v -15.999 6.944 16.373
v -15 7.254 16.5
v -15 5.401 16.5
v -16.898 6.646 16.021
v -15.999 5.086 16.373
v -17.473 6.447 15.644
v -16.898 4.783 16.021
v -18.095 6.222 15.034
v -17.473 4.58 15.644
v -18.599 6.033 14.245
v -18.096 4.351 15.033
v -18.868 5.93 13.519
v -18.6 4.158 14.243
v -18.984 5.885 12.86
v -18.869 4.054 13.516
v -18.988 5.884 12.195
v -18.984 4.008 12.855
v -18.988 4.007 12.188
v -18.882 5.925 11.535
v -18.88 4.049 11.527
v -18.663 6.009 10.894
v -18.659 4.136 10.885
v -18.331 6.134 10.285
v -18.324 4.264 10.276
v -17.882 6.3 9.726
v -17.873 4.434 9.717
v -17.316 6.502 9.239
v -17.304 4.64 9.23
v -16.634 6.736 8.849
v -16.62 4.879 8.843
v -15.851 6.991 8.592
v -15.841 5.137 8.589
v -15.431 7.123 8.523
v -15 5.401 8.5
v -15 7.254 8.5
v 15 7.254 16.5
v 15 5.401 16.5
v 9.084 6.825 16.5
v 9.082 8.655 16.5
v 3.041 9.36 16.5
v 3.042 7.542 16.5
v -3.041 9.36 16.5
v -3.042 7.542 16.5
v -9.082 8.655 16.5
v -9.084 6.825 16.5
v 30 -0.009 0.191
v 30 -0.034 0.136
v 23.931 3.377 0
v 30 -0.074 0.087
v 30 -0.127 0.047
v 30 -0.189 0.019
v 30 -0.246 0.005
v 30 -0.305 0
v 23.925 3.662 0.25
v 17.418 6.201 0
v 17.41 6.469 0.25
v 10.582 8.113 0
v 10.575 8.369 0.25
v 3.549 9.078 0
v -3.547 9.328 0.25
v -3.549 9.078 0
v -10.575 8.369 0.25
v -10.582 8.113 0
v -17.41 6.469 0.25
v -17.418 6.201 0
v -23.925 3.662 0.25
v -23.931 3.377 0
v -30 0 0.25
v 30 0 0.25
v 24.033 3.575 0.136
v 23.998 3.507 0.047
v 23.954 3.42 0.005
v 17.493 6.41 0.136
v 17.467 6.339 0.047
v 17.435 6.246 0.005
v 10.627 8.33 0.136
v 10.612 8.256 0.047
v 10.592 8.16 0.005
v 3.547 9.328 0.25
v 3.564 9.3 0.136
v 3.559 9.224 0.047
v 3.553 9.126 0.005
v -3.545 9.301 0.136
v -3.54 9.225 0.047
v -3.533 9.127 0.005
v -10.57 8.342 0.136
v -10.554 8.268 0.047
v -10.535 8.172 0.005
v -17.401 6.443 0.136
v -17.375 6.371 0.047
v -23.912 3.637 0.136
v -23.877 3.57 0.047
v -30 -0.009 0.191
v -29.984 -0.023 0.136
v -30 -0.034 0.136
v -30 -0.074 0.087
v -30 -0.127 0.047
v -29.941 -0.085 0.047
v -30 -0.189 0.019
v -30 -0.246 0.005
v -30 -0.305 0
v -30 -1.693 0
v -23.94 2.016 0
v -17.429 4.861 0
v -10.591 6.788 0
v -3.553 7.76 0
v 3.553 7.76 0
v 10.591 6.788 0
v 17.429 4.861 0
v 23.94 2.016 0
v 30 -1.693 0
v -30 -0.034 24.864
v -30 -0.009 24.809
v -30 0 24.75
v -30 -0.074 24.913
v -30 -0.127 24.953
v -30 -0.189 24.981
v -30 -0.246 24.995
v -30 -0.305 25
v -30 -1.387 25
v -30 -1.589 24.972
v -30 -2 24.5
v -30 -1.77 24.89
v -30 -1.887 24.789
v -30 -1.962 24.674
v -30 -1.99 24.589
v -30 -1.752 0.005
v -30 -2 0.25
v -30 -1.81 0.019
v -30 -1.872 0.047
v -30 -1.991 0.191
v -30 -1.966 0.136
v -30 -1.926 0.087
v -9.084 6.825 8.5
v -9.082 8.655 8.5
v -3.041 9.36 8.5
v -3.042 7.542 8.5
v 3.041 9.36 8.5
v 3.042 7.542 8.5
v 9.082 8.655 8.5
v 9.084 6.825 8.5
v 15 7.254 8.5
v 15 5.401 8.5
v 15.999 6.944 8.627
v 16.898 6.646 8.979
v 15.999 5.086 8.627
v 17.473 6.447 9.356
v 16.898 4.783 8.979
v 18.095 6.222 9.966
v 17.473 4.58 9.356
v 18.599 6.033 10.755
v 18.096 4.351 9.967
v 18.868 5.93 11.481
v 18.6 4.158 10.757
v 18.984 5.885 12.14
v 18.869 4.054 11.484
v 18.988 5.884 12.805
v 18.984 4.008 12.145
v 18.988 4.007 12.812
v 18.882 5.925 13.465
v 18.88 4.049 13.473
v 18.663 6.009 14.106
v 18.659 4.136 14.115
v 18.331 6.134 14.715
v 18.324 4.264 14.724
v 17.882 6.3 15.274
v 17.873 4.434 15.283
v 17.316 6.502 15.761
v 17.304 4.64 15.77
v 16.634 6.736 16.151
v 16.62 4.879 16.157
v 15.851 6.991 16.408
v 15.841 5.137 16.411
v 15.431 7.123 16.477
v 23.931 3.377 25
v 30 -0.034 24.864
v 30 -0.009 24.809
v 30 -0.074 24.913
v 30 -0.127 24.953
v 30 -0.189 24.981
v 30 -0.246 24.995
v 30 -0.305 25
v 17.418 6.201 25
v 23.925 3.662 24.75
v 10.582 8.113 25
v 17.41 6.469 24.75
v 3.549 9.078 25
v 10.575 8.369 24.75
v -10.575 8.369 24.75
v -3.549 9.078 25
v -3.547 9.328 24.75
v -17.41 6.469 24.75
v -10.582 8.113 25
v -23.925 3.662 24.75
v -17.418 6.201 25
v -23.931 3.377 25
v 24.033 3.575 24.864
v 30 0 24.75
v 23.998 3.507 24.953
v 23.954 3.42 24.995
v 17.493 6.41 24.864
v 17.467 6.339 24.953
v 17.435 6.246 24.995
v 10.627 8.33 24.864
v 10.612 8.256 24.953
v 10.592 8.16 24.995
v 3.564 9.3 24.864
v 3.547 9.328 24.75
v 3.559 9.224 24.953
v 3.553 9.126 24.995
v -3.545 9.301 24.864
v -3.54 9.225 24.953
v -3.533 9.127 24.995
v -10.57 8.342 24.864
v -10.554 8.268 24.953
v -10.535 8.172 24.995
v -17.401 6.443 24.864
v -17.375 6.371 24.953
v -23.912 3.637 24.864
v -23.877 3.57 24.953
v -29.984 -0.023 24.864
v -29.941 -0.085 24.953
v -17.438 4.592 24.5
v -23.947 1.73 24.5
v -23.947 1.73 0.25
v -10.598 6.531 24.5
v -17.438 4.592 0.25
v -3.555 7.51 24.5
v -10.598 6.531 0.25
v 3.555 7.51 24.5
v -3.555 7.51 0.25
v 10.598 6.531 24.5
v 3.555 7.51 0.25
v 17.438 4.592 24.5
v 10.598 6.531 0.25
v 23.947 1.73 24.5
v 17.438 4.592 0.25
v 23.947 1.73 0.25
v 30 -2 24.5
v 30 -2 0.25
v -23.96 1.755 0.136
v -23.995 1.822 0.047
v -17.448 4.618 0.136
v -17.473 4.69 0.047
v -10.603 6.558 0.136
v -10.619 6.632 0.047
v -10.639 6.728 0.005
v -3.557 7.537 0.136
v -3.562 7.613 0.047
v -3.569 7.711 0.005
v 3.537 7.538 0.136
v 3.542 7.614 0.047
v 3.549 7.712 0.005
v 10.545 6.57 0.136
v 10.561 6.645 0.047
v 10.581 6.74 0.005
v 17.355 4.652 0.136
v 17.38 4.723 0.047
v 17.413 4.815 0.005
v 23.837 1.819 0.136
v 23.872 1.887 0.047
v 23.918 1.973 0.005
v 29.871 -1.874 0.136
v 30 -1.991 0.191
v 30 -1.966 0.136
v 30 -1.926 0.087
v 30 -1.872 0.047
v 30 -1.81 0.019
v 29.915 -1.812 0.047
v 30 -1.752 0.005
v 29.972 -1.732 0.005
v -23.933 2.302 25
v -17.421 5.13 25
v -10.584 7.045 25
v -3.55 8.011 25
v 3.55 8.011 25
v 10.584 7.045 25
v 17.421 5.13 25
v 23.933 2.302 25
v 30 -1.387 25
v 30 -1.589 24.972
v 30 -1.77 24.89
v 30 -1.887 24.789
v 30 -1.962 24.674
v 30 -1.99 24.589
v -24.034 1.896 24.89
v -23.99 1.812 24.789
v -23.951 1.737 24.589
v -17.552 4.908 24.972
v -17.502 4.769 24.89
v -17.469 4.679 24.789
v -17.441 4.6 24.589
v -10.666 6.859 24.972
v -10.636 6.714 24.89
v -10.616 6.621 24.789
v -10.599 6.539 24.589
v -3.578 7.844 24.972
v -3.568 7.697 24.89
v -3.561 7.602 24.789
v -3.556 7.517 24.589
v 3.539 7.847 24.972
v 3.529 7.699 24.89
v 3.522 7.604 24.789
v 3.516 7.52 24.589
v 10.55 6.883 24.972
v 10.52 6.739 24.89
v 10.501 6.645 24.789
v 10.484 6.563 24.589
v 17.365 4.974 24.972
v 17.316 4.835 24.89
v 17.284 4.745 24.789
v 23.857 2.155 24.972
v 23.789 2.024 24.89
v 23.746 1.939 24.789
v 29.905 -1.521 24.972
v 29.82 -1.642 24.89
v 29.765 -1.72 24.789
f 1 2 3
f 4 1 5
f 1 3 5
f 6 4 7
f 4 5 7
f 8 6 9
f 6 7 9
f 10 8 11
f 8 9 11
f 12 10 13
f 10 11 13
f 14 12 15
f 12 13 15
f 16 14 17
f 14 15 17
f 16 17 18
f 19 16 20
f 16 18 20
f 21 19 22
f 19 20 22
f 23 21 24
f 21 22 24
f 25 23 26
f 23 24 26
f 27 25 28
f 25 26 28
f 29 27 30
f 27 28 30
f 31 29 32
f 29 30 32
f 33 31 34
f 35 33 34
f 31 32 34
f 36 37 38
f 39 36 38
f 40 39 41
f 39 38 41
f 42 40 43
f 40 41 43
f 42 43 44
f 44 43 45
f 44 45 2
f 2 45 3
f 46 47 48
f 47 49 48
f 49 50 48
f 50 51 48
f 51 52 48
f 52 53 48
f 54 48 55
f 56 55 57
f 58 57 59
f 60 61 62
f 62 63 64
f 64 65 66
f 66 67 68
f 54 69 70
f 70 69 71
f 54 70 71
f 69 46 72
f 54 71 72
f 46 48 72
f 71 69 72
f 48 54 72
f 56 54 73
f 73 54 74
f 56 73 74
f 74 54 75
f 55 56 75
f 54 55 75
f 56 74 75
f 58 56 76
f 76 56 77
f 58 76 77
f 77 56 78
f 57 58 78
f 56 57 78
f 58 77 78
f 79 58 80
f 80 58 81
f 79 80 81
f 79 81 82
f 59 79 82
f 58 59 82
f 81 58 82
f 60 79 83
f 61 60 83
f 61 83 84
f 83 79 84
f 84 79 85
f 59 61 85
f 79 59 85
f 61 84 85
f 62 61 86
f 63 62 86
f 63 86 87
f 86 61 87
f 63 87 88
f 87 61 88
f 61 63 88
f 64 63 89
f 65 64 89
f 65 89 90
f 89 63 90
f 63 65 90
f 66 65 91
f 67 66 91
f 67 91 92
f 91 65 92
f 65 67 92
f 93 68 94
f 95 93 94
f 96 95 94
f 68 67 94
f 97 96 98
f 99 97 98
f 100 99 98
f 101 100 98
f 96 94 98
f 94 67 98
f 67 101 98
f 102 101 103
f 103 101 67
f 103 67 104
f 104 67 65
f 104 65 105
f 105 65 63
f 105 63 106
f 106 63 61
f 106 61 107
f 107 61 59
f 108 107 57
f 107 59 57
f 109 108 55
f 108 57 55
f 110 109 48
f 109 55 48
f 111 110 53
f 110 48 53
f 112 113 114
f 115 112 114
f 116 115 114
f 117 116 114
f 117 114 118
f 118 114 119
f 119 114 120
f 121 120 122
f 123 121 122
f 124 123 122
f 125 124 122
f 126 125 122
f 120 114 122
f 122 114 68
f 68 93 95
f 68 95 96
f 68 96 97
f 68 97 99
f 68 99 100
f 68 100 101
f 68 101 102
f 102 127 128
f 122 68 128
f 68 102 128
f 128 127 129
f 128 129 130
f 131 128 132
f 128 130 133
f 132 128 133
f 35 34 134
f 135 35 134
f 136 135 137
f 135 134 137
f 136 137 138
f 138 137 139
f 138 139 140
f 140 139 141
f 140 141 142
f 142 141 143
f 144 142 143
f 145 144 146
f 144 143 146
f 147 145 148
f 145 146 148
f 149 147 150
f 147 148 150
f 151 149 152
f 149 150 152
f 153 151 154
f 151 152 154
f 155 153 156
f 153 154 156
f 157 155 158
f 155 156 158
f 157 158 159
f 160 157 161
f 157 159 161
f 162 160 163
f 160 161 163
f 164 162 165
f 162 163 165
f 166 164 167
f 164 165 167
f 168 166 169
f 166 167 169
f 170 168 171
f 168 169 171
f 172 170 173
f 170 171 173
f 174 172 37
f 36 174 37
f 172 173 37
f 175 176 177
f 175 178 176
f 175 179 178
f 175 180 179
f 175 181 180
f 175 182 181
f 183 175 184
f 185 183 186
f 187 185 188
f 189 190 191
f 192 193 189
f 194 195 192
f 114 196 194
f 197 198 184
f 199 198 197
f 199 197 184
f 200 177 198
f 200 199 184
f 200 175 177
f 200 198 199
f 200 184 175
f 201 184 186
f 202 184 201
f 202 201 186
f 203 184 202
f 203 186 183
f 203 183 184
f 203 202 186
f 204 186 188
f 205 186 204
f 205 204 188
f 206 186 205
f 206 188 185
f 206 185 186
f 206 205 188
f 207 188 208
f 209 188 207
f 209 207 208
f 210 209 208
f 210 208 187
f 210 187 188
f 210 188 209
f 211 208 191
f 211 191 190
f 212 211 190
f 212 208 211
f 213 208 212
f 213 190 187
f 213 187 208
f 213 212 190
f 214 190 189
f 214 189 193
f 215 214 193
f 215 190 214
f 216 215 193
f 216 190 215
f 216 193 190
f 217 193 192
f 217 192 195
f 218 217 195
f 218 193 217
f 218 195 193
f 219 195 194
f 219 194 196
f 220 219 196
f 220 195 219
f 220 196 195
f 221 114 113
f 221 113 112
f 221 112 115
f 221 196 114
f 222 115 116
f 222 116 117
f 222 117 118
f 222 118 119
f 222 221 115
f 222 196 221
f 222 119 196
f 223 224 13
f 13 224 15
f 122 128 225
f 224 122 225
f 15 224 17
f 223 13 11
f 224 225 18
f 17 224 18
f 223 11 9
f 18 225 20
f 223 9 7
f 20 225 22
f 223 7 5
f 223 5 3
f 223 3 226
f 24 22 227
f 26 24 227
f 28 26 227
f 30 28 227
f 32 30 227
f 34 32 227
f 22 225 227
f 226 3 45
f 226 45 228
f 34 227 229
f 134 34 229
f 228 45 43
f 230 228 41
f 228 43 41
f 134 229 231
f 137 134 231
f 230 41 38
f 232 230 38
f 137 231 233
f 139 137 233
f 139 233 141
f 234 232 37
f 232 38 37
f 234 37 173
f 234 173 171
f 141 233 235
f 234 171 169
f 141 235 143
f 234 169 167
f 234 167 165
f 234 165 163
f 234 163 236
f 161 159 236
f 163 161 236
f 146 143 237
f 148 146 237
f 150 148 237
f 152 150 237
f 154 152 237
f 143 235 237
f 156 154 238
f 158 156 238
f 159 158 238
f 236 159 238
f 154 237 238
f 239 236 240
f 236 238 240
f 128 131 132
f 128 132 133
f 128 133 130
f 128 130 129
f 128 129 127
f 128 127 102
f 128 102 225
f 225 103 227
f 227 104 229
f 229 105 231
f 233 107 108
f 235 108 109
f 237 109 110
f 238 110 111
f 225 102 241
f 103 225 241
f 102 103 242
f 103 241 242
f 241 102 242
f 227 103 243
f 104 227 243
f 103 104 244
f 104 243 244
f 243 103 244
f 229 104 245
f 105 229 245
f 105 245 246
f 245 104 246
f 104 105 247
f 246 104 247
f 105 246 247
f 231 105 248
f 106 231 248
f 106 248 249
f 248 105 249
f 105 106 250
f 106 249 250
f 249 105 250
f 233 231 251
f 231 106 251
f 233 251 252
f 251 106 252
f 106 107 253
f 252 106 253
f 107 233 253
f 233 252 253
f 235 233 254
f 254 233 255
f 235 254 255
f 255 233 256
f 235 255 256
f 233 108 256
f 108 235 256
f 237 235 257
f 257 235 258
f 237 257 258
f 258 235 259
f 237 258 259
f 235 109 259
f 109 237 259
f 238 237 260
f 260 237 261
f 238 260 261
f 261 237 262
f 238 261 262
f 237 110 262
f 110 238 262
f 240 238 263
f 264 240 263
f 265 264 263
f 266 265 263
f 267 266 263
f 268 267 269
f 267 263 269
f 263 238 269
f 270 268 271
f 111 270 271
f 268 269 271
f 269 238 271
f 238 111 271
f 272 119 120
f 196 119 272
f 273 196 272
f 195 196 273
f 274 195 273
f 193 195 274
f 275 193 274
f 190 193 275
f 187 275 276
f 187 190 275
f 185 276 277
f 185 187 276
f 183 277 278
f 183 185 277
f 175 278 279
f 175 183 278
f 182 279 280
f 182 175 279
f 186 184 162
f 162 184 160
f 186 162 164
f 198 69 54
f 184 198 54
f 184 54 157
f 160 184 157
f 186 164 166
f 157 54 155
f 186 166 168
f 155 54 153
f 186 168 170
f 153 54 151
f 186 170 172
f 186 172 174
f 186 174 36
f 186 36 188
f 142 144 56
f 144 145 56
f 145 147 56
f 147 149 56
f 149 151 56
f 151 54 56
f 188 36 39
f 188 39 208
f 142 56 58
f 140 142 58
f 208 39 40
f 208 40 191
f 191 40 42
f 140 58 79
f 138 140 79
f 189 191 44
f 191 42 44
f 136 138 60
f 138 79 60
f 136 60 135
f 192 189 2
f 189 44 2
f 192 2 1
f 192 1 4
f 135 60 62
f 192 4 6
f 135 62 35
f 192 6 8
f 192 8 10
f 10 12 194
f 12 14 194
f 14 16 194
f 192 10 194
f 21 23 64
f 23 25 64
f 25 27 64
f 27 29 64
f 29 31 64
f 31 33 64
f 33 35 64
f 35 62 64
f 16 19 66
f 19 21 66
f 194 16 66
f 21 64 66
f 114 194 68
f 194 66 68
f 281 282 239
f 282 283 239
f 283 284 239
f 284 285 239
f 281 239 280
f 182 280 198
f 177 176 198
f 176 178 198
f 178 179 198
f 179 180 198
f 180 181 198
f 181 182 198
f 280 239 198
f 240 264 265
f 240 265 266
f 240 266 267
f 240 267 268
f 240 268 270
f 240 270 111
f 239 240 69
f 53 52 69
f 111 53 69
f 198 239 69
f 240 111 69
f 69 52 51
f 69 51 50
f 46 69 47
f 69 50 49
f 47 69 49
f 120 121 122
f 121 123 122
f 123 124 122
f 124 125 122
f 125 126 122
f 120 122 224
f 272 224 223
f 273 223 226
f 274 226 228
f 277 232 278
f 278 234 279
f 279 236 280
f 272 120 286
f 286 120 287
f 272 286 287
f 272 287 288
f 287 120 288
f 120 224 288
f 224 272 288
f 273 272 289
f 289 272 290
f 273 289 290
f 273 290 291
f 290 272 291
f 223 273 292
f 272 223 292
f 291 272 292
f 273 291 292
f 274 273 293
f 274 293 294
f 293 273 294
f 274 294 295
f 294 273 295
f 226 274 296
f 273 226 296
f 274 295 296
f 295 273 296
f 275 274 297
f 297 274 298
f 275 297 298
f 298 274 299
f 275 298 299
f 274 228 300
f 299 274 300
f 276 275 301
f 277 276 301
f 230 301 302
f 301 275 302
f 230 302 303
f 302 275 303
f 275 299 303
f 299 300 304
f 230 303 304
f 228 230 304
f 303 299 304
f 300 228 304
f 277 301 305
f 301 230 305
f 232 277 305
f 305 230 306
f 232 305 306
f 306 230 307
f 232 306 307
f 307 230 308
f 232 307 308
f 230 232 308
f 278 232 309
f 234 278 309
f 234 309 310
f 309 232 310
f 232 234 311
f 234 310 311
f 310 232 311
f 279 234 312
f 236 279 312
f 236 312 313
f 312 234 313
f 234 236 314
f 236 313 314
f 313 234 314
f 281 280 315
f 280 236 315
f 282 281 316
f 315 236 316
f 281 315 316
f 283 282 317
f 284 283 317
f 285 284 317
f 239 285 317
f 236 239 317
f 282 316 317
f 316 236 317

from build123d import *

# Parameters (mm, degrees)
BOSS_EXTRUDE1_DEPTH = 25
FILLET2_R           = 0.25
FILLET3_R           = 0.5
FILLET5_R           = 0.25
CUT_EXTRUDE2_DEPTH  = 10.448688931


with BuildPart() as part:
    # Sketch1 → Boss-Extrude1 (new body)
    with BuildSketch(Plane.XY):
        with BuildLine():
            Line((-30, 0), (-30, -2))
            ThreePointArc((-30, -2), (0, 7.632365953), (30, -2))
            Line((30, -2), (30, 0))
            ThreePointArc((30, 0), (0, 9.448688831), (-30, 0))
        make_face()
    extrude(amount=BOSS_EXTRUDE1_DEPTH)

    # Fillet2
    fillet2_edges = [part.edges().sort_by_distance(p)[0] for p in [
        (0, 9.448688831, 25),
    ]]
    fillet(fillet2_edges, radius=FILLET2_R)

    # Fillet3
    fillet3_edges = [part.edges().sort_by_distance(p)[0] for p in [
        (0, 7.632365953, 25),
    ]]
    fillet(fillet3_edges, radius=FILLET3_R)

    # Fillet5
    fillet5_edges = [part.edges().sort_by_distance(p)[0] for p in [
        (0, 9.448688831, 0),
        (0, 7.632365953, 0),
    ]]
    fillet(fillet5_edges, radius=FILLET5_R)

    # Sketch6 → Cut-Extrude2 (cut, through all)
    with BuildSketch(Plane(origin=(0, 0, 0), x_dir=(1, 0, 0), z_dir=(0, 1, 0))):
        with BuildLine():
            Line((-15, -8.5), (15, -8.5))
            ThreePointArc((15, -8.5), (19, -12.5), (15, -16.5))
            Line((15, -16.5), (-15, -16.5))
            ThreePointArc((-15, -16.5), (-19, -12.5), (-15, -8.5))
        make_face()
    extrude(amount=CUT_EXTRUDE2_DEPTH, mode=Mode.SUBTRACT)


solid = part.part
